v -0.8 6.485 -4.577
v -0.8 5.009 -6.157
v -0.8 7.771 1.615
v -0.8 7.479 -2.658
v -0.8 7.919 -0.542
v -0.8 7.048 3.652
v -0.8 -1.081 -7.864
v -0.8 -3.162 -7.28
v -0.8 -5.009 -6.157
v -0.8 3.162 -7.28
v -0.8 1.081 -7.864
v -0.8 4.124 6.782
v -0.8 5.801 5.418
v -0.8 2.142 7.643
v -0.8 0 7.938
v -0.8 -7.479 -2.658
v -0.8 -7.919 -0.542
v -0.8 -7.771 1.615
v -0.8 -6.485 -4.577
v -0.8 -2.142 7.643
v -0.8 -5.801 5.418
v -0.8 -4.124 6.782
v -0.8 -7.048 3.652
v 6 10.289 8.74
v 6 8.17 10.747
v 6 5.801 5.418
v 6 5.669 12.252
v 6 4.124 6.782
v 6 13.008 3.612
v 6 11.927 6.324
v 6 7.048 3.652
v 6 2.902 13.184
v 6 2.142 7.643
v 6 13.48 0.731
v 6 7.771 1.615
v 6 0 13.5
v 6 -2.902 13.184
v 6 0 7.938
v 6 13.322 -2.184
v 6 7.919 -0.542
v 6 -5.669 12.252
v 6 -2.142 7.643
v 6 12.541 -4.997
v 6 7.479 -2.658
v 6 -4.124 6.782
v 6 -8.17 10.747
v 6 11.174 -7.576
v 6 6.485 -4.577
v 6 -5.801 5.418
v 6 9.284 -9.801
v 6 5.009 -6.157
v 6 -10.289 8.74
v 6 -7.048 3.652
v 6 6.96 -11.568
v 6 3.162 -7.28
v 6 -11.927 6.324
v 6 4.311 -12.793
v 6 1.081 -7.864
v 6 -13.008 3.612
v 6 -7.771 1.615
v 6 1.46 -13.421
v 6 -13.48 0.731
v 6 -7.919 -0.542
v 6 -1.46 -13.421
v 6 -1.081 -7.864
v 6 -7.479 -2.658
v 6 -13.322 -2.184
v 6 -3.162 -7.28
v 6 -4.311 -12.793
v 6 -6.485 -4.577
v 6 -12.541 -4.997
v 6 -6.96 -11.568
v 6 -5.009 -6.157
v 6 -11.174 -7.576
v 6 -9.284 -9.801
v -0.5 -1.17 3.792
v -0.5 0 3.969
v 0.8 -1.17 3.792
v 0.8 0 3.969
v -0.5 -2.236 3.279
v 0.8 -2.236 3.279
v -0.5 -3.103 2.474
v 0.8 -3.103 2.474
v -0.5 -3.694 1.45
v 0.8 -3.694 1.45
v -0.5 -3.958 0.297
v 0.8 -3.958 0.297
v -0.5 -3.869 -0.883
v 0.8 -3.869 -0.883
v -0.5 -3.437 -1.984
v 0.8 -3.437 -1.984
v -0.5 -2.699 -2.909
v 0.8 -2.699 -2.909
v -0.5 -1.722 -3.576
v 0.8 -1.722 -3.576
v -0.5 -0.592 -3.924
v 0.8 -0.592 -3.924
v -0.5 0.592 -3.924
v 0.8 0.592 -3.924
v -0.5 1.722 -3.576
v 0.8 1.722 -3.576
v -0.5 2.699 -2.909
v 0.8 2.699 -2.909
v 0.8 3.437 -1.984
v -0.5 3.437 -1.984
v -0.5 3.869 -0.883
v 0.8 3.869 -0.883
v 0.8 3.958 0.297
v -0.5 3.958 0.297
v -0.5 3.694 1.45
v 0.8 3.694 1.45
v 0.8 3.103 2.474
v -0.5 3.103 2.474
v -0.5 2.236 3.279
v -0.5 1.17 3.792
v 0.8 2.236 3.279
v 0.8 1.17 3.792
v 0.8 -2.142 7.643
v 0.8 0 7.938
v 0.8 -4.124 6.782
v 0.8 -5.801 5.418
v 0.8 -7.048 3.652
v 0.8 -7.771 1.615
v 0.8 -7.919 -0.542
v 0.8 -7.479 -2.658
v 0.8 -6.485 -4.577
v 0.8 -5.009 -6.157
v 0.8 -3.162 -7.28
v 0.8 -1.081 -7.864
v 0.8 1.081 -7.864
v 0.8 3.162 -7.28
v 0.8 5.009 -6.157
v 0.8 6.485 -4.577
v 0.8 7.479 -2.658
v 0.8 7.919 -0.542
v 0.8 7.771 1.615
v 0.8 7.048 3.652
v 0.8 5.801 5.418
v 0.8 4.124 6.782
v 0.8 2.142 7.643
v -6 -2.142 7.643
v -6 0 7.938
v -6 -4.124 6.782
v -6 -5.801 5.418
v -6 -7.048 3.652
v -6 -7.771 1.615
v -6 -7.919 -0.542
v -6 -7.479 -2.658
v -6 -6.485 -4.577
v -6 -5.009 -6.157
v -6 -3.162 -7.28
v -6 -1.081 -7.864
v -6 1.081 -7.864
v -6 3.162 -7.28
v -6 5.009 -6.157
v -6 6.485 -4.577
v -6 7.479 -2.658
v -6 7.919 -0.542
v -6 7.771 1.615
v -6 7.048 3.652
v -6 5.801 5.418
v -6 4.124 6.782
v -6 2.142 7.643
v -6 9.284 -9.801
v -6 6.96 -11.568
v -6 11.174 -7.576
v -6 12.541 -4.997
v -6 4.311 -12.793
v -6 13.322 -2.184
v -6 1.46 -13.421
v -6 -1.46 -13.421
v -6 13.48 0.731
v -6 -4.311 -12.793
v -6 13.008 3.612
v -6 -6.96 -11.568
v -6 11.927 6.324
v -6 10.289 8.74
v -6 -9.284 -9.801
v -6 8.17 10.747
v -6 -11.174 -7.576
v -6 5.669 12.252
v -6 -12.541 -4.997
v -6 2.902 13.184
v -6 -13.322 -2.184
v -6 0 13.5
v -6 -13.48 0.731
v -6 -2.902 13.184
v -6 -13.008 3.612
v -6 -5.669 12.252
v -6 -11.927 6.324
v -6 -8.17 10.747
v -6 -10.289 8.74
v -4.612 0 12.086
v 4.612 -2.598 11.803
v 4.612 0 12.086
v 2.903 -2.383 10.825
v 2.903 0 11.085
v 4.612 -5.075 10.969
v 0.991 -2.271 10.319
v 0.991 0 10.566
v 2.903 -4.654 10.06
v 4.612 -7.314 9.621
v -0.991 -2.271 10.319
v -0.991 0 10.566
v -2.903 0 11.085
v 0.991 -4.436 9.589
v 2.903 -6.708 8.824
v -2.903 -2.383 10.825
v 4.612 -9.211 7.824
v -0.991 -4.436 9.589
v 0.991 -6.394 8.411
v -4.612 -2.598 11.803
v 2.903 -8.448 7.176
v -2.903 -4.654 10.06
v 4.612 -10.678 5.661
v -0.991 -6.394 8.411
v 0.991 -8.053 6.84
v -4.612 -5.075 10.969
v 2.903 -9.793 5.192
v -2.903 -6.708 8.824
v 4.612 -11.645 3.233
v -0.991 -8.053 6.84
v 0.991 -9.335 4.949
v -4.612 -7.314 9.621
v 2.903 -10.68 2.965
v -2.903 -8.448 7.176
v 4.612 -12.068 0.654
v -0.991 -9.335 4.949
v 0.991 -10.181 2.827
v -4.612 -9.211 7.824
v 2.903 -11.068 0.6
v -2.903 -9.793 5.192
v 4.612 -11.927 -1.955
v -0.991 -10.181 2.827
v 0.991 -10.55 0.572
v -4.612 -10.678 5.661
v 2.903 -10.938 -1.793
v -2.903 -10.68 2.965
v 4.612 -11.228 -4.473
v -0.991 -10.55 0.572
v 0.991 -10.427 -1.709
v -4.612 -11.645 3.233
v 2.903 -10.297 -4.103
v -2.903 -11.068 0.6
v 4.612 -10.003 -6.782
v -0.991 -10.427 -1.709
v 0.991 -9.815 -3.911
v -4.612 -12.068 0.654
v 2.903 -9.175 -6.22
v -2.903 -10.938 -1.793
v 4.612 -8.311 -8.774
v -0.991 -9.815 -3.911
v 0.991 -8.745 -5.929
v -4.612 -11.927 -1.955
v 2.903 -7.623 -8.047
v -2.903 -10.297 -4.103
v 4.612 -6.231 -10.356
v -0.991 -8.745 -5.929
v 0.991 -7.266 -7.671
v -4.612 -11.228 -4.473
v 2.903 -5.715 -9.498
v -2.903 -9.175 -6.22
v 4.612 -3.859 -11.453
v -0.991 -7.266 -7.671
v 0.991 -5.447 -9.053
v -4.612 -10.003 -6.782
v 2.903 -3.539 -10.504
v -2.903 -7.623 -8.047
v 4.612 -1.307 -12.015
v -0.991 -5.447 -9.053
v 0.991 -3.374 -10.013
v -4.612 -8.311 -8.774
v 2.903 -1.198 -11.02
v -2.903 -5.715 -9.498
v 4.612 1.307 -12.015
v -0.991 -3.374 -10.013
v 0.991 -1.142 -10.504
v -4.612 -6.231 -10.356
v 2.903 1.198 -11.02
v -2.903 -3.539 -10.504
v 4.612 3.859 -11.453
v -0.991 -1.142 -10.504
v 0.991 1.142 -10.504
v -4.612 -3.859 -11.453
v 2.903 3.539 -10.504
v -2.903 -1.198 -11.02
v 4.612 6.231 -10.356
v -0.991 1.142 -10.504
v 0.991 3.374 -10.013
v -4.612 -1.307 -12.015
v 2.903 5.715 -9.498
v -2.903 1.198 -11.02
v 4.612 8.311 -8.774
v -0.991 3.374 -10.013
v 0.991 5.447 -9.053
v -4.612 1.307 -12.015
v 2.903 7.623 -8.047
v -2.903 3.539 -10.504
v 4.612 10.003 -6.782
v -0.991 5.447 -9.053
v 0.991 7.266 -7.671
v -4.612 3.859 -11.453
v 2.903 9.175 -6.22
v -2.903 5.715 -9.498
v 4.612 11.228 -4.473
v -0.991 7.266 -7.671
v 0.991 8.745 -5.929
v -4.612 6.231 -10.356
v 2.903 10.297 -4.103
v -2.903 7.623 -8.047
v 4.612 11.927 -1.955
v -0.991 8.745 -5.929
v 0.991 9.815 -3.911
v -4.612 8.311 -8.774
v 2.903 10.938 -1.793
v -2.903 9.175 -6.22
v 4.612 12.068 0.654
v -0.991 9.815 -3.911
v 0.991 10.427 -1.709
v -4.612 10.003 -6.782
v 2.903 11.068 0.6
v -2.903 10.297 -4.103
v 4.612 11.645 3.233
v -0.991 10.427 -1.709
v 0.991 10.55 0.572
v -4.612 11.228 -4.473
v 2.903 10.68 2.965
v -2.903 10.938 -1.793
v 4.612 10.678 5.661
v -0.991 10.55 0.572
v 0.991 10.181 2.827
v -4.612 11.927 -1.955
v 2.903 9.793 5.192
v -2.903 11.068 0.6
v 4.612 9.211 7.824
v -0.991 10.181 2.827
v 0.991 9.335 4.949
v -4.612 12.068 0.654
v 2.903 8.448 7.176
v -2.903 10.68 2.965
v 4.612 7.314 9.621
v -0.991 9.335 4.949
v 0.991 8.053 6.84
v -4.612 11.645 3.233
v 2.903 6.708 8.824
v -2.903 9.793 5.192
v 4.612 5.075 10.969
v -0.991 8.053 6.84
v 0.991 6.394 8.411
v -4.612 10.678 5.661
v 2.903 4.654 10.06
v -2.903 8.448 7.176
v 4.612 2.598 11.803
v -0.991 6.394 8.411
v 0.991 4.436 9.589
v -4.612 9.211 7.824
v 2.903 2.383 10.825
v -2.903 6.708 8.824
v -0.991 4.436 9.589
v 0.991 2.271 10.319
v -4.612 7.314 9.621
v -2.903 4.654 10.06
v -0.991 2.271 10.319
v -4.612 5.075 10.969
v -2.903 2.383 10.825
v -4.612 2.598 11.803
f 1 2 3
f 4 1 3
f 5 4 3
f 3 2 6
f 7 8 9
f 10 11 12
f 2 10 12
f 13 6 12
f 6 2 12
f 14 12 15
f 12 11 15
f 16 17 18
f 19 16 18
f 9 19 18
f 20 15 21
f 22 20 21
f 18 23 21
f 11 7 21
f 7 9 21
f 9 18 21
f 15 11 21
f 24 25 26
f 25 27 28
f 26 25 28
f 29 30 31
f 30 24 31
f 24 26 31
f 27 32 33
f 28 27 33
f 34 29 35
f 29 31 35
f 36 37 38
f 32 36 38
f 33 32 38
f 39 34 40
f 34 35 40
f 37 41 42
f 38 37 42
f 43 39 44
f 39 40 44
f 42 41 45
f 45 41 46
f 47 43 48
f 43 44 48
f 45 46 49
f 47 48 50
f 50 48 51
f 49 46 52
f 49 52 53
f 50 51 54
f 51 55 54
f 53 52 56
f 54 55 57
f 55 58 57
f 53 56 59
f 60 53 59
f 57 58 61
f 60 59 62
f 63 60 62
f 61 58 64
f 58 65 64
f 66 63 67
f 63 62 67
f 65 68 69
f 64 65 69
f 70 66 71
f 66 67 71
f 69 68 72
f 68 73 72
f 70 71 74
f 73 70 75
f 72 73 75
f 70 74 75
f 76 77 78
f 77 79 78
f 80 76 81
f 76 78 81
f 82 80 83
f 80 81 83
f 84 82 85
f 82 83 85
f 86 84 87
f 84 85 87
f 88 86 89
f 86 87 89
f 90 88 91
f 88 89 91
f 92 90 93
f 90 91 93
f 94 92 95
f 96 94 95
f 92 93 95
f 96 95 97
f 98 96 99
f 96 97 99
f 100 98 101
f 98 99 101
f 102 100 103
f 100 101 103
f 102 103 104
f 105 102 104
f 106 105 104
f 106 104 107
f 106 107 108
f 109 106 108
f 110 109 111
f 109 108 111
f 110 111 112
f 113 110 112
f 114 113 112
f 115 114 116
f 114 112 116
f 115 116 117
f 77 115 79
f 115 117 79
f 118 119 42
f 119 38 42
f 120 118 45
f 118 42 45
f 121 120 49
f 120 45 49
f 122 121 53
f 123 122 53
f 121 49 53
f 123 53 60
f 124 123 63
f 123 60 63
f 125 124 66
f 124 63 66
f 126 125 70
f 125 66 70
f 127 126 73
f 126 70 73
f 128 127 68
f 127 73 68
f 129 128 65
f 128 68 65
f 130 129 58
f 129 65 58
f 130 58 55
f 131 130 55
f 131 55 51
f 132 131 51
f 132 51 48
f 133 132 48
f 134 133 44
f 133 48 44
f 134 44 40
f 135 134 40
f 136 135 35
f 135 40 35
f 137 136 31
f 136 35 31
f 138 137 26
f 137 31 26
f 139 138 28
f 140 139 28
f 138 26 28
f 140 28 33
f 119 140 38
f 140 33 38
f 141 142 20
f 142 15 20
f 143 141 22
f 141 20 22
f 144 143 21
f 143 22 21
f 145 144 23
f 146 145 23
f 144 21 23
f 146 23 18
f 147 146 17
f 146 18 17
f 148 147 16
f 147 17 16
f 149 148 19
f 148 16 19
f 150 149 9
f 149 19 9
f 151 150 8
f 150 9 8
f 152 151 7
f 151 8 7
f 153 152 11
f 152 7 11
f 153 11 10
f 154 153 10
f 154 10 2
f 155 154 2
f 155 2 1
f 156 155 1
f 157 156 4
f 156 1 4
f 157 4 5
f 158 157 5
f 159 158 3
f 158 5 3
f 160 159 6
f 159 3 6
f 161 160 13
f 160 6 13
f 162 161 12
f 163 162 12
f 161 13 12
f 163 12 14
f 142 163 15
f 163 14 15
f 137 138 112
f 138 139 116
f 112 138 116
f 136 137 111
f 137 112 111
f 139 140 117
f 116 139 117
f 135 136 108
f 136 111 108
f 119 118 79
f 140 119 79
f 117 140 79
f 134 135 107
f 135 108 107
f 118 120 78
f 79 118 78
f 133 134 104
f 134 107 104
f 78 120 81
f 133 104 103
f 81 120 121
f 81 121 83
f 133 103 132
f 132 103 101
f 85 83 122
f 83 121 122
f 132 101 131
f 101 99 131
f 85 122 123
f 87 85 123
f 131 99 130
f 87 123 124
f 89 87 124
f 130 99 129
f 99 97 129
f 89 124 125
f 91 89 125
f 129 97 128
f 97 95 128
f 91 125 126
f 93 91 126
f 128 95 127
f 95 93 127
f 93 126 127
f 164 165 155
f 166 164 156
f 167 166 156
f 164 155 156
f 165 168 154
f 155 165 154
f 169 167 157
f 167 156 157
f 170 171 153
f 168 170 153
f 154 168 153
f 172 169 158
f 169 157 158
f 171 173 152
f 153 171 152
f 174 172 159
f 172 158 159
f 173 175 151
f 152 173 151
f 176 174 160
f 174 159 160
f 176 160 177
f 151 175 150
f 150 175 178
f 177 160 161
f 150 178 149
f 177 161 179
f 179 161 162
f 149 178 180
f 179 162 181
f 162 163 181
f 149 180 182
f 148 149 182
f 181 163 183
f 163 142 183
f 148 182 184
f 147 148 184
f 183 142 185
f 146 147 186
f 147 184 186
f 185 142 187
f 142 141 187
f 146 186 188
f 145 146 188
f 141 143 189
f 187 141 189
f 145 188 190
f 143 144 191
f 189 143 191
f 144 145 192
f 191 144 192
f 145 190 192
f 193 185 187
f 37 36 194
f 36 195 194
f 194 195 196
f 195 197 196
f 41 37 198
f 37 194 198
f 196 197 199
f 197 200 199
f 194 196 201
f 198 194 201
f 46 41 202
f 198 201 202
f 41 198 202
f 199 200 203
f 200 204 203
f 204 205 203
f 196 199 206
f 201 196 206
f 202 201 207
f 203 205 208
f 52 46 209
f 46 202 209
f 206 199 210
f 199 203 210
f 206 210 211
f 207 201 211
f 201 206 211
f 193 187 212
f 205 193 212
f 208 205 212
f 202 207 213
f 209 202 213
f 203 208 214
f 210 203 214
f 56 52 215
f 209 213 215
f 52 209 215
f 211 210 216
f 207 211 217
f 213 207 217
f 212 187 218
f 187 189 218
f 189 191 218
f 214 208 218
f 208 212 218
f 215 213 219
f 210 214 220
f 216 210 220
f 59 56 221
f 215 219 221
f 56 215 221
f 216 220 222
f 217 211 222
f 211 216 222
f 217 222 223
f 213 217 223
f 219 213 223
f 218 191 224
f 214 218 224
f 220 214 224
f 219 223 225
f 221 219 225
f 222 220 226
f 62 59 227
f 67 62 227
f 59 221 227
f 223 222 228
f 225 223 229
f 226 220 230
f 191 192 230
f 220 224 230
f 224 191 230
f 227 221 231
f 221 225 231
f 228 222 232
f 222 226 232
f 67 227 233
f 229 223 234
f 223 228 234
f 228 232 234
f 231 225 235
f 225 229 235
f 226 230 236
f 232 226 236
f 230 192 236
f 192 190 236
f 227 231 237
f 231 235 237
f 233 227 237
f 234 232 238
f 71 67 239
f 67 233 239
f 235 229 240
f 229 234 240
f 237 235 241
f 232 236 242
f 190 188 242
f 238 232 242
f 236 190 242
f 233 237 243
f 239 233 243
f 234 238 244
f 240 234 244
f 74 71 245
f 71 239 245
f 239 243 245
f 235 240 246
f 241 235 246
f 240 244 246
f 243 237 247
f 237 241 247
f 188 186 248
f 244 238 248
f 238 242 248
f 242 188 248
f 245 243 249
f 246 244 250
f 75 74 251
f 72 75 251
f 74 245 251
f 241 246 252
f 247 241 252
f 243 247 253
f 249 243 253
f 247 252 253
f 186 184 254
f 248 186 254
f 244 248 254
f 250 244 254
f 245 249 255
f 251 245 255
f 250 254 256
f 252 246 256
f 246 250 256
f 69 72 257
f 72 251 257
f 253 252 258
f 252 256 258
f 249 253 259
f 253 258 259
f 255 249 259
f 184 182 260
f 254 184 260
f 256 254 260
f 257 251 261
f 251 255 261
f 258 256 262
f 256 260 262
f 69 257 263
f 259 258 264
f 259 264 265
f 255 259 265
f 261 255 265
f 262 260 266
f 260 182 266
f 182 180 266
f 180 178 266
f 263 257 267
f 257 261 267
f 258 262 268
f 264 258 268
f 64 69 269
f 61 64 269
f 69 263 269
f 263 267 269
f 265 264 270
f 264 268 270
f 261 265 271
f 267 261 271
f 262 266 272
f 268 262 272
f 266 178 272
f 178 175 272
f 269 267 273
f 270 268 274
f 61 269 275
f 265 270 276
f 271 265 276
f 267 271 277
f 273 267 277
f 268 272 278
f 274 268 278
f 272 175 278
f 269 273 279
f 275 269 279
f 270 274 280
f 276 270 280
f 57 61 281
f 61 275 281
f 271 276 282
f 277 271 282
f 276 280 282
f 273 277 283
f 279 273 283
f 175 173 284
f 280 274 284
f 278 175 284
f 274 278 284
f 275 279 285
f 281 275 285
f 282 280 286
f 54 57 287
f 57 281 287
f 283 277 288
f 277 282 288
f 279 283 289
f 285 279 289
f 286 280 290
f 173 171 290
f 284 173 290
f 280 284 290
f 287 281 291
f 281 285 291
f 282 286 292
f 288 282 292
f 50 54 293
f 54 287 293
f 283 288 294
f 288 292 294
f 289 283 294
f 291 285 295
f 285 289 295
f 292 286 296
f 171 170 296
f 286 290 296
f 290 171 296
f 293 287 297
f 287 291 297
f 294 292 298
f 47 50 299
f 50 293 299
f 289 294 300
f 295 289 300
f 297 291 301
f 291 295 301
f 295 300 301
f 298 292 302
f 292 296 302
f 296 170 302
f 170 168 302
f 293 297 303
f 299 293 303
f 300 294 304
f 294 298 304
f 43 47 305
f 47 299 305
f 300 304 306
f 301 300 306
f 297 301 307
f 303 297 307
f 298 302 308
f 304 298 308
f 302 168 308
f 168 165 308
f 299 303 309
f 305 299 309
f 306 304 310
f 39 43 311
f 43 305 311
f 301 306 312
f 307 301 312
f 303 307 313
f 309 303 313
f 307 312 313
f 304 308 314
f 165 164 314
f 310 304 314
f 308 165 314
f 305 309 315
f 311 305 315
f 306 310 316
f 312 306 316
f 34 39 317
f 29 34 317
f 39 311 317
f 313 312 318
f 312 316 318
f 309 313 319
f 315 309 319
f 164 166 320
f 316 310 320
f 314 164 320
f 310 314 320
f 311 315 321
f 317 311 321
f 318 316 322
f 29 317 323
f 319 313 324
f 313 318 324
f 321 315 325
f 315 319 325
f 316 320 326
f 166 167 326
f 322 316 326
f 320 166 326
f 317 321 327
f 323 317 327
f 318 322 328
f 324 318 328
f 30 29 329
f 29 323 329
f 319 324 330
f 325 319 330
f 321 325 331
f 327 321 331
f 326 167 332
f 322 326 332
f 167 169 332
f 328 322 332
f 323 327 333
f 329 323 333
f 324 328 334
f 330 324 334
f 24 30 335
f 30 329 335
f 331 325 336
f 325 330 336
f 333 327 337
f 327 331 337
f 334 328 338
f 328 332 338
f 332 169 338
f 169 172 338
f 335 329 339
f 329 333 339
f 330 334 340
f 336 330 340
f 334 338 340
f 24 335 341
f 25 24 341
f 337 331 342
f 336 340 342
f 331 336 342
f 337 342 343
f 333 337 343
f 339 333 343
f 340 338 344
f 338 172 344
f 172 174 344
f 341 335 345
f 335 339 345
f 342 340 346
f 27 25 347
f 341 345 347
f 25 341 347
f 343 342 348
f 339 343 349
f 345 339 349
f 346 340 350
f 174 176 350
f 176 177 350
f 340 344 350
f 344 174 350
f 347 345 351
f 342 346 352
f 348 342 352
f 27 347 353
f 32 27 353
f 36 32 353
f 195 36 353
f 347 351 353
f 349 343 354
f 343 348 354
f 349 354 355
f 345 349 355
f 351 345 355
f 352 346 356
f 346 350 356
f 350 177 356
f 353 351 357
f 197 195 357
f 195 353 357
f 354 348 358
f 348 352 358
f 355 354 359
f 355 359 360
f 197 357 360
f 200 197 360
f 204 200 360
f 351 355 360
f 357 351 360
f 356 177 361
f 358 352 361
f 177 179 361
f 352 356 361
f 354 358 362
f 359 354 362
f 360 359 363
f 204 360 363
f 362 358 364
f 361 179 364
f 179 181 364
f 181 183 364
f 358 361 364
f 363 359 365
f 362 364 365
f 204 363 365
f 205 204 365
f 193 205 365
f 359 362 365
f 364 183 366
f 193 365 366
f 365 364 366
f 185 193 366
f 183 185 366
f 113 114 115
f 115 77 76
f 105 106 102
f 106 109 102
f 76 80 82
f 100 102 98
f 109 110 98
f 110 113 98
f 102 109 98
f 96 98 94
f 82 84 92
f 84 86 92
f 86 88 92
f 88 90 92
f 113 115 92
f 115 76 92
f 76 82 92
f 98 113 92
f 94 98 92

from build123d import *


# Not quite as in the source:
# - a feature names something its author has since deleted; it is built from what else it names


with BuildPart() as f1:
    # F0 (on Front) → F1 (revolve)
    with BuildSketch(Plane.XZ):
        with BuildLine():
            Line((6, 7.9375), (6, 13.5))
            ThreePointArc((6, 13.5), (0, 10.5), (-6, 13.5))
            Line((-6, 13.5), (-6, 7.9375))
            Line((-6, 7.9375), (-0.8, 7.9375))
            Line((-0.8, 7.9375), (-0.8, 0))
            Line((-0.8, 0), (-0.5, 0))
            Line((-0.5, 0), (-0.5, 3.96875))
            Line((-0.5, 3.96875), (0.8, 3.96875))
            Line((0.8, 3.96875), (0.8, 7.9375))
            Line((0.8, 7.9375), (6, 7.9375))
        make_face()
    revolve(axis=Axis((-0.4498892081, 0, 0), (1, 0, 0)))


solid = f1.part
